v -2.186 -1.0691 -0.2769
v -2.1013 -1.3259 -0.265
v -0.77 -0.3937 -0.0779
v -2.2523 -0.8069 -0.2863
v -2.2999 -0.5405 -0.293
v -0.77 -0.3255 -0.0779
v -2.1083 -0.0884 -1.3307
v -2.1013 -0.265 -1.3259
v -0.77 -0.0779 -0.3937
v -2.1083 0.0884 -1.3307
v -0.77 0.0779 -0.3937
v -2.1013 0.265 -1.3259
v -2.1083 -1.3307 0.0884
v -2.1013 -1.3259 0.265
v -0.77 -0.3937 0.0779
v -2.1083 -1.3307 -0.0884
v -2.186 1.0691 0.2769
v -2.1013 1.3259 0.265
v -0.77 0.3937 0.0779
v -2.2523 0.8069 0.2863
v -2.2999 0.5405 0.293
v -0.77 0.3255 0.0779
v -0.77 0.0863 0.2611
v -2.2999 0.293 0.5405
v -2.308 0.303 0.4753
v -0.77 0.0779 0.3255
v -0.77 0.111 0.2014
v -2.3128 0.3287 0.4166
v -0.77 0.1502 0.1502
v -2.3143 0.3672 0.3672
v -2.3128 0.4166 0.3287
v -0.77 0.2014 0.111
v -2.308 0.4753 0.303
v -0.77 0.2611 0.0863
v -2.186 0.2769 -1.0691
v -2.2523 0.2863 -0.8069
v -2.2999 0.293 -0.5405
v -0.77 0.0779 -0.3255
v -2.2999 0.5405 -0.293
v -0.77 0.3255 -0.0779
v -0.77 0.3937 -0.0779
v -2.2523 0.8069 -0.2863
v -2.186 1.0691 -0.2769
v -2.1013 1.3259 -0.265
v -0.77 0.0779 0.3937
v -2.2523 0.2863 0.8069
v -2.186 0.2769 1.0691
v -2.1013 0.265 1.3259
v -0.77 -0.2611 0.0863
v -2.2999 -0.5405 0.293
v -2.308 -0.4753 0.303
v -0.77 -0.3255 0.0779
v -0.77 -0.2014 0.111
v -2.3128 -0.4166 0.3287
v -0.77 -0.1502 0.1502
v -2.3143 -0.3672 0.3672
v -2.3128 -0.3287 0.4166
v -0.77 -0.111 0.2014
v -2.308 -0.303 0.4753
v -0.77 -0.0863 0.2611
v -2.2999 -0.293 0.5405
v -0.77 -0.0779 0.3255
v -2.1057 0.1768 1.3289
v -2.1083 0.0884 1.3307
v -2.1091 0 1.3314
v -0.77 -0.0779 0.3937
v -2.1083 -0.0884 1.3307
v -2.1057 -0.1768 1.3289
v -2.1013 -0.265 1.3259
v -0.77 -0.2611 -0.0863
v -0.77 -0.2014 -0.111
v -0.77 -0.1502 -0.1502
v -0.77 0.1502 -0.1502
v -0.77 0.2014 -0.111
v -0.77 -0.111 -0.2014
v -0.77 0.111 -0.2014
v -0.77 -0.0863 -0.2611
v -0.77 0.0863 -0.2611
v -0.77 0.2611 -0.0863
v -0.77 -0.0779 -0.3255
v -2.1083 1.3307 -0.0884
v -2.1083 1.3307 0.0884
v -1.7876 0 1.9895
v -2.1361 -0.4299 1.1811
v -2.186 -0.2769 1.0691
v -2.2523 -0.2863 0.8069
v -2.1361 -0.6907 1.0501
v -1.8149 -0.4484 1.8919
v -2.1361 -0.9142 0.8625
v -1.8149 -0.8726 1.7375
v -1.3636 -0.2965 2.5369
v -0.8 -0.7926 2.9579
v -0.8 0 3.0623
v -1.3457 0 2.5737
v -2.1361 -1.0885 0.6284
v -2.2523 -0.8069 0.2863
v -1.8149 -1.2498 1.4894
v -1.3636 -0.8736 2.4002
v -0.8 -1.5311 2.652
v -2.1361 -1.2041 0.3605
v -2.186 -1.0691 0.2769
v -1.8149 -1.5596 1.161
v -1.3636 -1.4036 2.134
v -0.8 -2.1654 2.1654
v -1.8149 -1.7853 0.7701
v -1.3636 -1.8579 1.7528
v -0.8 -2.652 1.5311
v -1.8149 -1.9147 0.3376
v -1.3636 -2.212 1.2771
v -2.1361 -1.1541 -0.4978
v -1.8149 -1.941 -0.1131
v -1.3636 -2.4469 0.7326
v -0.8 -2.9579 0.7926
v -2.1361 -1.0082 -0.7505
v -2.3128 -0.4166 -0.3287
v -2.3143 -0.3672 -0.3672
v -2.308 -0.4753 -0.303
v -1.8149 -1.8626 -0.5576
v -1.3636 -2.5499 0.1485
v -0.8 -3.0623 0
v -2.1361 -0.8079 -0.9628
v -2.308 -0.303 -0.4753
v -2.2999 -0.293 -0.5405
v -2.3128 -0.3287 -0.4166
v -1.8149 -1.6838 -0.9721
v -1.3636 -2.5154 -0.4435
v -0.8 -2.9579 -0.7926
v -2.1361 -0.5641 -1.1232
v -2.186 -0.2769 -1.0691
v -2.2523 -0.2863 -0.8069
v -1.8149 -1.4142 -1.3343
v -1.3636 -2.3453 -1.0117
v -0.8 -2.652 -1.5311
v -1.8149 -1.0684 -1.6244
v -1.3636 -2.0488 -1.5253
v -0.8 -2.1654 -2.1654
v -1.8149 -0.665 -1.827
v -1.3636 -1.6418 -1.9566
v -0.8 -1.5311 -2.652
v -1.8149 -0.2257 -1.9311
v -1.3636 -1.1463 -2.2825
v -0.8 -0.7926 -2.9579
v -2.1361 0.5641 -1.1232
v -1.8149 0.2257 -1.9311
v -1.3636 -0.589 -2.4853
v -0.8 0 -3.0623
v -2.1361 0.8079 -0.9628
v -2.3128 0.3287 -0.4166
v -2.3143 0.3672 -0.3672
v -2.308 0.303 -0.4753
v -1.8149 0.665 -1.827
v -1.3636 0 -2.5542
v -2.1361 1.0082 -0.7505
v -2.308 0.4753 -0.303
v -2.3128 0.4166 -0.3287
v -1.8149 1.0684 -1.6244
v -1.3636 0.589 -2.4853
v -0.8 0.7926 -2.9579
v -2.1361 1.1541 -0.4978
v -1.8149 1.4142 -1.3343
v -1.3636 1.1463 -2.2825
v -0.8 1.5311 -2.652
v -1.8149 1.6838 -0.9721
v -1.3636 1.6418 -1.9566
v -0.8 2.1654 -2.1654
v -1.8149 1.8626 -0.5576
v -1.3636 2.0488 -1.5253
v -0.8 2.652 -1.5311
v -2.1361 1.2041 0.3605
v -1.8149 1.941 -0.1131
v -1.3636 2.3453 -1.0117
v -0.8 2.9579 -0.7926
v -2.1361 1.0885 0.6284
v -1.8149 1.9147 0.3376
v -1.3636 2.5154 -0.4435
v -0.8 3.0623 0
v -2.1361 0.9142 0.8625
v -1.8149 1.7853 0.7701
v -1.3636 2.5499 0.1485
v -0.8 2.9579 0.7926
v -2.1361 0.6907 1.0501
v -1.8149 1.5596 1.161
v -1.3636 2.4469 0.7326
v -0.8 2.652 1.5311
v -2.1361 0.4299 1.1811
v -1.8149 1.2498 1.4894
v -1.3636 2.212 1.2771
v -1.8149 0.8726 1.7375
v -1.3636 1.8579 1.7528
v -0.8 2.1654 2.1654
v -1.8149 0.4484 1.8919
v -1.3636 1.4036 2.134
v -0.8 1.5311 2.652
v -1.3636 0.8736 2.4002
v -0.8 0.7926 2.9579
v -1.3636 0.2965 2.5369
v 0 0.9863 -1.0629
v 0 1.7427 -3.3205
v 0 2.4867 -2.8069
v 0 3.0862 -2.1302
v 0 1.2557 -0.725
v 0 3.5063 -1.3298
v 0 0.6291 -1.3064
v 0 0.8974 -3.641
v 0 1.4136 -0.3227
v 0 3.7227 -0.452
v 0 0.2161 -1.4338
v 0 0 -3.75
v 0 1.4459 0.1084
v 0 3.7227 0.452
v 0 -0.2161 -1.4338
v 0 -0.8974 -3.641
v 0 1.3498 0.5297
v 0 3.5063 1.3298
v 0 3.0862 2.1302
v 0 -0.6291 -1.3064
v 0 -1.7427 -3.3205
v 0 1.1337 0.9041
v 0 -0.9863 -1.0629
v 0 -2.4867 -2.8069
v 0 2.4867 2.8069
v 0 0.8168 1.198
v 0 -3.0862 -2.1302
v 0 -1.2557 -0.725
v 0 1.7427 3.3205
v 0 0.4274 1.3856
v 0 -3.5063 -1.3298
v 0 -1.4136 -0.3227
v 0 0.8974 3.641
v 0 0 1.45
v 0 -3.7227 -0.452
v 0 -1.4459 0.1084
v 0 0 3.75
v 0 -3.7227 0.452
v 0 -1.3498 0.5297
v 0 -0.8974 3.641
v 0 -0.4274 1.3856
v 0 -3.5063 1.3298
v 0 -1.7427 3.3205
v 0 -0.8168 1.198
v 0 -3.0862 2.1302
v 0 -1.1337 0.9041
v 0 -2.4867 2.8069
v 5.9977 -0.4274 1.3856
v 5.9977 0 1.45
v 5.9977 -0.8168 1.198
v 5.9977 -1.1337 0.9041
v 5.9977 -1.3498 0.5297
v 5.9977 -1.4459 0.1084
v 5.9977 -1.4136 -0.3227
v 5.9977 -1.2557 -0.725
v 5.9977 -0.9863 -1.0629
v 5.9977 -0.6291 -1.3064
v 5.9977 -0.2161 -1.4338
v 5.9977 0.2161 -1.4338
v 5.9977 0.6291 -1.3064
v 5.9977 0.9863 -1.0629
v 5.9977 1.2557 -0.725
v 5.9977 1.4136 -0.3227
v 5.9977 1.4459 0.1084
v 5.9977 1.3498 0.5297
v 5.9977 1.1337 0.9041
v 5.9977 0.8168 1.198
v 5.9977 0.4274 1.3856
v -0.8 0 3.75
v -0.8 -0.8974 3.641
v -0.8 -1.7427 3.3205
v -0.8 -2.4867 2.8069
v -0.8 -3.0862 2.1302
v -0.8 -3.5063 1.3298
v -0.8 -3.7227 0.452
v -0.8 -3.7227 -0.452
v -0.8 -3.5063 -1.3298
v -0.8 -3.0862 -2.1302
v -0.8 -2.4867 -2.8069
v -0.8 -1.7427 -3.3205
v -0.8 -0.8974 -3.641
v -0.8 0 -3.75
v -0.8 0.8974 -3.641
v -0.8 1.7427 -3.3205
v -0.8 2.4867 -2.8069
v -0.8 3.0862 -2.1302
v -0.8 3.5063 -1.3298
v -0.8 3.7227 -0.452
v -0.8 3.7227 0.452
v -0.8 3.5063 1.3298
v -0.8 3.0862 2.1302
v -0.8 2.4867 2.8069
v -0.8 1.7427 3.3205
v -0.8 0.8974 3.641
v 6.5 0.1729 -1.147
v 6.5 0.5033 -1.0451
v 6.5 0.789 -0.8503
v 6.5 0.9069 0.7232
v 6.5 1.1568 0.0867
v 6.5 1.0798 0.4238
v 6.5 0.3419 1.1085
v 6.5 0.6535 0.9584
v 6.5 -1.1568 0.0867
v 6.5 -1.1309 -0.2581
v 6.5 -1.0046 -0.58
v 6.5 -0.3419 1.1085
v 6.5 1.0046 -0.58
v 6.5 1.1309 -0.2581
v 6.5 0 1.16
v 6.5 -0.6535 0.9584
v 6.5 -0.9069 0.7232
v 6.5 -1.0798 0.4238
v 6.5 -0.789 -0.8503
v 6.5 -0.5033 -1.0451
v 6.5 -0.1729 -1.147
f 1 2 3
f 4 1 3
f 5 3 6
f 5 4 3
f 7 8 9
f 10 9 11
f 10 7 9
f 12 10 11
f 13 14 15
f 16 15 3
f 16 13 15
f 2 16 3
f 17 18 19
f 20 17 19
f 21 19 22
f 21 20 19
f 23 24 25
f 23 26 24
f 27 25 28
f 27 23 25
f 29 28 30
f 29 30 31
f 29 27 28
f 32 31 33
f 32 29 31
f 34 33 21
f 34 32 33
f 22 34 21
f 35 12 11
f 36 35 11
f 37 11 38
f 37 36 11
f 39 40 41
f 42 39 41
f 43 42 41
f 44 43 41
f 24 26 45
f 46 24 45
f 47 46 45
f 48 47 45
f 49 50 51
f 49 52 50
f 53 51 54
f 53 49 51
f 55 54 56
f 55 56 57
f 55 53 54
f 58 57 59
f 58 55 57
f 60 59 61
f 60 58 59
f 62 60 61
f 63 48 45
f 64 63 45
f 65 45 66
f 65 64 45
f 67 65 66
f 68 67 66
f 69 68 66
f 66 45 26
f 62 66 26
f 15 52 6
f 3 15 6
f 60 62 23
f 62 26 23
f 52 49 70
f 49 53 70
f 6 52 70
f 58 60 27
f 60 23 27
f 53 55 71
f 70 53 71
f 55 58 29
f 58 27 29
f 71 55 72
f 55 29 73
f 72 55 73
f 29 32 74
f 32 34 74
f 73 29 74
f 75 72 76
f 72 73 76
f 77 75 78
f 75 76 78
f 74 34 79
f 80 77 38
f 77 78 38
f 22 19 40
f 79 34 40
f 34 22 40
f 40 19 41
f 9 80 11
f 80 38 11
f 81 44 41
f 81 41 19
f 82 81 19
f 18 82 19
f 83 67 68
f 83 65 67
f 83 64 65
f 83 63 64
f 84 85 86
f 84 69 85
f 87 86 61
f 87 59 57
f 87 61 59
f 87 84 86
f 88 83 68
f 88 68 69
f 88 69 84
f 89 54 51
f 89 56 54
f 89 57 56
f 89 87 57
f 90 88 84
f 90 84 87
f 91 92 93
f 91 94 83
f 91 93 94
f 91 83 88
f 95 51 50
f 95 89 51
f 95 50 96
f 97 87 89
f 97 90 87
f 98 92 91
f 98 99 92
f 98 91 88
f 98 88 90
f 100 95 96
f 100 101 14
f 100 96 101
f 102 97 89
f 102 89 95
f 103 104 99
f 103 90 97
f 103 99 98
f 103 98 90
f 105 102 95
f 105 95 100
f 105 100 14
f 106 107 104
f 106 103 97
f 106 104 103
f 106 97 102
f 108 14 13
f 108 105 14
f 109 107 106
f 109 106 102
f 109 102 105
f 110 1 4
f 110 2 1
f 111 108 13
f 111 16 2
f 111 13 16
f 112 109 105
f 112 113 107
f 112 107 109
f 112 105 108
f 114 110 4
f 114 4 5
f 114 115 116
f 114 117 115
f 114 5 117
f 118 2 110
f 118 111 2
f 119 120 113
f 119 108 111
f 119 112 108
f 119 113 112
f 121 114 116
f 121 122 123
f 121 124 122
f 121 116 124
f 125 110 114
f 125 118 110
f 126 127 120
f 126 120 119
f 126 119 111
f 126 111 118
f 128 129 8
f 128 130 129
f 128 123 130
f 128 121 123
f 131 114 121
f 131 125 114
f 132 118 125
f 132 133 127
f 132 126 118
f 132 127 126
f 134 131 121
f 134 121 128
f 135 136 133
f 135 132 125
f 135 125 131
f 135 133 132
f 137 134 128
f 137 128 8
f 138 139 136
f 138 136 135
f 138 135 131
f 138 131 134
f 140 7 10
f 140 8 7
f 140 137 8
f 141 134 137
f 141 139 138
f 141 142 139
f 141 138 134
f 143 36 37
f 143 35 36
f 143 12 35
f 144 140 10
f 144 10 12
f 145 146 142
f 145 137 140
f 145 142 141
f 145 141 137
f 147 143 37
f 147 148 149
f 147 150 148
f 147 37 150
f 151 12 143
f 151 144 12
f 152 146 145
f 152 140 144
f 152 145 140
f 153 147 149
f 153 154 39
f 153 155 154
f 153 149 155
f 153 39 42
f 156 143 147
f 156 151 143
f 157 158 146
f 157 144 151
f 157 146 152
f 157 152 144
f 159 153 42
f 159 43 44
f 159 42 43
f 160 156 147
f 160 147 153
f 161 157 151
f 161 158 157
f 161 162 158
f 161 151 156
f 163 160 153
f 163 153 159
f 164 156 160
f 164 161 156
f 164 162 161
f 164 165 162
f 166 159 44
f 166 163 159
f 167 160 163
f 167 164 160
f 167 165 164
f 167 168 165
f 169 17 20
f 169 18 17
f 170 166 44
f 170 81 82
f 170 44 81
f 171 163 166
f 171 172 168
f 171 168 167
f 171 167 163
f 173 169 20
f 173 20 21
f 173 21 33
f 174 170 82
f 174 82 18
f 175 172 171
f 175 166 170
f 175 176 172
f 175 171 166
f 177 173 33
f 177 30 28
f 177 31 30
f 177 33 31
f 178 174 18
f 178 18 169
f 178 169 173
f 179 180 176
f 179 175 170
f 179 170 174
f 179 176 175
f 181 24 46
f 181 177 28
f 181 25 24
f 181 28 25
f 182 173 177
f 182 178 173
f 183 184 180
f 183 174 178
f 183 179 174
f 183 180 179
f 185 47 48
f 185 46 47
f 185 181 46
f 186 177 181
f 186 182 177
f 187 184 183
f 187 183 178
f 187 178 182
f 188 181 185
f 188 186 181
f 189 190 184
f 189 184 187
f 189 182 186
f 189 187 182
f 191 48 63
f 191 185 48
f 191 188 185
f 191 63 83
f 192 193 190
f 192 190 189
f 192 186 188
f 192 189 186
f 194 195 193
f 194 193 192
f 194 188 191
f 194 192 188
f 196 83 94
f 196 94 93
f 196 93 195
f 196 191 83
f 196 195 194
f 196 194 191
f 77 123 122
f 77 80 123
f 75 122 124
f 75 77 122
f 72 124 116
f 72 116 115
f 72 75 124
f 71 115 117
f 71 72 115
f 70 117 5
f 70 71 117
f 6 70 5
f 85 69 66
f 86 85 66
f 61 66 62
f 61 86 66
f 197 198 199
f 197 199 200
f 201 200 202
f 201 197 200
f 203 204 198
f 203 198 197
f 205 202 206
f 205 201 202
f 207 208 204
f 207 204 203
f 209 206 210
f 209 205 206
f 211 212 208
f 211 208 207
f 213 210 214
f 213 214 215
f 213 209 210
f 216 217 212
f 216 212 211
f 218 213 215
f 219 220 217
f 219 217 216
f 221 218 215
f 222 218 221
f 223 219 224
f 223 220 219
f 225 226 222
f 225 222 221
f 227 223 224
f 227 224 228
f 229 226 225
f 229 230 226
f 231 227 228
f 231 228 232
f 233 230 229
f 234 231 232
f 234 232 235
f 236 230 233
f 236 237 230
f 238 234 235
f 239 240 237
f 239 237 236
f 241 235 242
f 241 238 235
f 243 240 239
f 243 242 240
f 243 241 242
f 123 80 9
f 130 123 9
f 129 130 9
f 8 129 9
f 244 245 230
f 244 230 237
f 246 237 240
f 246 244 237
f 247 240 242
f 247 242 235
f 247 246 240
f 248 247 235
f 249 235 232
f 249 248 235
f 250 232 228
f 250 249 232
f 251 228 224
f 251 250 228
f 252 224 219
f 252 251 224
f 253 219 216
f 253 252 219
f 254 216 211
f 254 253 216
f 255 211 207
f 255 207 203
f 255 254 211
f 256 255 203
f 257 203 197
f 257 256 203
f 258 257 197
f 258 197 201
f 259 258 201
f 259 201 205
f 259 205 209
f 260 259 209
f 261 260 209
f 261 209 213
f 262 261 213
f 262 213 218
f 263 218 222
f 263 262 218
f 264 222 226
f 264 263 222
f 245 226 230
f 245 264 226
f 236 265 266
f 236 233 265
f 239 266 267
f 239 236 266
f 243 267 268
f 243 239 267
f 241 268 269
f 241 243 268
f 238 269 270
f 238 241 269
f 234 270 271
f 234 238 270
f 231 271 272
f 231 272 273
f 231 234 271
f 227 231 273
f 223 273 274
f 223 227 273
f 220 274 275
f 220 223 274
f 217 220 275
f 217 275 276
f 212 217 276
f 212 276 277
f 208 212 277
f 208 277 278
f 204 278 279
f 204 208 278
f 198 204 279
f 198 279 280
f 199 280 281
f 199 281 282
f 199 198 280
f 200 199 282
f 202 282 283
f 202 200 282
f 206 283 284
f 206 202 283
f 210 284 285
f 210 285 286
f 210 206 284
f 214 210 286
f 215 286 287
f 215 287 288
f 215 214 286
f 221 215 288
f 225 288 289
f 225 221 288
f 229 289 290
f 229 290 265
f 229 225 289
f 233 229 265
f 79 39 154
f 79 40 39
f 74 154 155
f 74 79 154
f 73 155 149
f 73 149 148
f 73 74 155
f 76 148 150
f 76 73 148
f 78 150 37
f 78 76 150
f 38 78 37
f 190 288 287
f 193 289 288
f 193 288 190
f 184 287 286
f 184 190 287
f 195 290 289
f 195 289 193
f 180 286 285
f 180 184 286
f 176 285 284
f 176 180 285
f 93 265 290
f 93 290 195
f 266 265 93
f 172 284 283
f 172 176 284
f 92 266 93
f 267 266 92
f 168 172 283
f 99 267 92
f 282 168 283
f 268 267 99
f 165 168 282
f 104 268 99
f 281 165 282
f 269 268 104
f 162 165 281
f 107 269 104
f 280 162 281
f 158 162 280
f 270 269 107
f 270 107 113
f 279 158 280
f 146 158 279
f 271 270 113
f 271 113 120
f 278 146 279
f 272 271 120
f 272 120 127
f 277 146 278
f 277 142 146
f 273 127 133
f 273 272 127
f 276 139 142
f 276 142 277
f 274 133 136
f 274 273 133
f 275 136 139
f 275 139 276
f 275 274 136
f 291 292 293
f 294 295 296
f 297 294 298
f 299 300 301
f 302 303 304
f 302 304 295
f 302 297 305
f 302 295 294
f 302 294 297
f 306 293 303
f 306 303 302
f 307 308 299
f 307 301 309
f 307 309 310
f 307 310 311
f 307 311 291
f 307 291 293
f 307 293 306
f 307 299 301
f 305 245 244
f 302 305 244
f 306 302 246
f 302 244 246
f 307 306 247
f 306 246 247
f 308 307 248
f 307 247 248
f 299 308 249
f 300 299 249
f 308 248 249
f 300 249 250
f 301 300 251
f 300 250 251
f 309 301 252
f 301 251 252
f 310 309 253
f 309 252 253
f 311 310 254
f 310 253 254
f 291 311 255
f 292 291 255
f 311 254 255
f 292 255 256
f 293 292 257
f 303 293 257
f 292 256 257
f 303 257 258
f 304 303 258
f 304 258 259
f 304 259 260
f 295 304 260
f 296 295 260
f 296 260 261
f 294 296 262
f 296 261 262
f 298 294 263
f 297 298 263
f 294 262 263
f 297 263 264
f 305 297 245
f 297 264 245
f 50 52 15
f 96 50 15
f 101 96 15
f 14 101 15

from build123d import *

# Parameters (mm, degrees)
CHAMFER1_SIZE      = 0.29
CHAMFER1_SIZE2     = 0.502294734
CUT_EXTRUDE1_DEPTH = 1.58
DRAFT1_ANGLE       = -35
DRAFT2_ANGLE       = -8
FILLET1_R          = 0.25


with BuildPart() as part:
    # Sketch1 → Revolve1 (revolve)
    with BuildSketch(Plane.XY, mode=Mode.PRIVATE) as revolve1_sk:
        with BuildLine():
            Line((0, 3.75), (0, 1.45))
            Line((0, 1.45), (6.5, 1.45))
            Line((6.5, 1.45), (6.5, 0))
            Line((6.5, 0), (-2.35, 0))
            ThreePointArc((-2.35, 0), (-1.940427702, 1.71610023), (-0.8, 3.0622704))
            Line((-0.8, 3.0622704), (-0.8, 3.75))
            Line((-0.8, 3.75), (0, 3.75))
        make_face()
    revolve(revolve1_sk.sketch.rotate(Axis((-6.478309986, 0, 0), (1, 0, 0)), 90), axis=Axis((-6.478309986, 0, 0), (1, 0, 0)))

    # Chamfer1
    chamfer1_edges = [part.edges().sort_by_distance(p)[0] for p in [
        (6.5, 0, -1.45),
    ]]
    chamfer1_side = [part.faces().sort_by_distance(p)[0] for p in [
        (6.5, 0, 0),
    ]]
    chamfer(chamfer1_edges, length=CHAMFER1_SIZE, length2=CHAMFER1_SIZE2, reference=chamfer1_side[0])

    # Sketch4 → Cut-Extrude1 (cut)
    with BuildSketch(Plane(origin=(-2.35, 0, 0), x_dir=(0, 0, -1), z_dir=(1, 0, 0))):
        Polygon((0.3, 1.5), (-0.3, 1.5), (-0.3, 0.3), (-1.5, 0.3), (-1.5, -0.3), (-0.3, -0.3), (-0.3, -1.5), (0.3, -1.5), (0.3, -0.3), (1.5, -0.3), (1.5, 0.3), (0.3, 0.3), align=None)
    extrude(amount=CUT_EXTRUDE1_DEPTH, mode=Mode.SUBTRACT)

    # Draft1
    draft1_faces = [part.faces().sort_by_distance(p)[0] for p in [
        (-1.403564361, 0, -1.5),
        (-1.403564361, -1.5, 0),
        (-1.403564361, 0, 1.5),
        (-1.403564361, 1.5, 0),
    ]]
    draft(draft1_faces, Plane.YZ.offset(-2.35), DRAFT1_ANGLE)

    # Draft2
    draft2_faces = [part.faces().sort_by_distance(p)[0] for p in [
        (-1.709589538, 0.648659775, -0.3),
        (-1.709589538, 0.3, -0.648659775),
        (-1.709589538, -0.3, -0.648659775),
        (-1.709589538, -0.648659775, -0.3),
        (-1.709589538, -0.648659775, 0.3),
        (-1.709589538, -0.3, 0.648659775),
        (-1.709589538, 0.3, 0.648659775),
        (-1.709589538, 0.648659775, 0.3),
    ]]
    draft(draft2_faces, Plane.YZ.offset(-2.35), DRAFT2_ANGLE)

    # Fillet1
    fillet1_edges = [part.edges().sort_by_distance(p)[0] for p in [
        (-1.548378832, 0.187339492, -0.187339492),
        (-1.548378832, 0.187339492, 0.187339492),
        (-1.548378832, -0.187339492, 0.187339492),
        (-1.548378832, -0.187339492, -0.187339492),
    ]]
    fillet(fillet1_edges, radius=FILLET1_R)


solid = part.part
